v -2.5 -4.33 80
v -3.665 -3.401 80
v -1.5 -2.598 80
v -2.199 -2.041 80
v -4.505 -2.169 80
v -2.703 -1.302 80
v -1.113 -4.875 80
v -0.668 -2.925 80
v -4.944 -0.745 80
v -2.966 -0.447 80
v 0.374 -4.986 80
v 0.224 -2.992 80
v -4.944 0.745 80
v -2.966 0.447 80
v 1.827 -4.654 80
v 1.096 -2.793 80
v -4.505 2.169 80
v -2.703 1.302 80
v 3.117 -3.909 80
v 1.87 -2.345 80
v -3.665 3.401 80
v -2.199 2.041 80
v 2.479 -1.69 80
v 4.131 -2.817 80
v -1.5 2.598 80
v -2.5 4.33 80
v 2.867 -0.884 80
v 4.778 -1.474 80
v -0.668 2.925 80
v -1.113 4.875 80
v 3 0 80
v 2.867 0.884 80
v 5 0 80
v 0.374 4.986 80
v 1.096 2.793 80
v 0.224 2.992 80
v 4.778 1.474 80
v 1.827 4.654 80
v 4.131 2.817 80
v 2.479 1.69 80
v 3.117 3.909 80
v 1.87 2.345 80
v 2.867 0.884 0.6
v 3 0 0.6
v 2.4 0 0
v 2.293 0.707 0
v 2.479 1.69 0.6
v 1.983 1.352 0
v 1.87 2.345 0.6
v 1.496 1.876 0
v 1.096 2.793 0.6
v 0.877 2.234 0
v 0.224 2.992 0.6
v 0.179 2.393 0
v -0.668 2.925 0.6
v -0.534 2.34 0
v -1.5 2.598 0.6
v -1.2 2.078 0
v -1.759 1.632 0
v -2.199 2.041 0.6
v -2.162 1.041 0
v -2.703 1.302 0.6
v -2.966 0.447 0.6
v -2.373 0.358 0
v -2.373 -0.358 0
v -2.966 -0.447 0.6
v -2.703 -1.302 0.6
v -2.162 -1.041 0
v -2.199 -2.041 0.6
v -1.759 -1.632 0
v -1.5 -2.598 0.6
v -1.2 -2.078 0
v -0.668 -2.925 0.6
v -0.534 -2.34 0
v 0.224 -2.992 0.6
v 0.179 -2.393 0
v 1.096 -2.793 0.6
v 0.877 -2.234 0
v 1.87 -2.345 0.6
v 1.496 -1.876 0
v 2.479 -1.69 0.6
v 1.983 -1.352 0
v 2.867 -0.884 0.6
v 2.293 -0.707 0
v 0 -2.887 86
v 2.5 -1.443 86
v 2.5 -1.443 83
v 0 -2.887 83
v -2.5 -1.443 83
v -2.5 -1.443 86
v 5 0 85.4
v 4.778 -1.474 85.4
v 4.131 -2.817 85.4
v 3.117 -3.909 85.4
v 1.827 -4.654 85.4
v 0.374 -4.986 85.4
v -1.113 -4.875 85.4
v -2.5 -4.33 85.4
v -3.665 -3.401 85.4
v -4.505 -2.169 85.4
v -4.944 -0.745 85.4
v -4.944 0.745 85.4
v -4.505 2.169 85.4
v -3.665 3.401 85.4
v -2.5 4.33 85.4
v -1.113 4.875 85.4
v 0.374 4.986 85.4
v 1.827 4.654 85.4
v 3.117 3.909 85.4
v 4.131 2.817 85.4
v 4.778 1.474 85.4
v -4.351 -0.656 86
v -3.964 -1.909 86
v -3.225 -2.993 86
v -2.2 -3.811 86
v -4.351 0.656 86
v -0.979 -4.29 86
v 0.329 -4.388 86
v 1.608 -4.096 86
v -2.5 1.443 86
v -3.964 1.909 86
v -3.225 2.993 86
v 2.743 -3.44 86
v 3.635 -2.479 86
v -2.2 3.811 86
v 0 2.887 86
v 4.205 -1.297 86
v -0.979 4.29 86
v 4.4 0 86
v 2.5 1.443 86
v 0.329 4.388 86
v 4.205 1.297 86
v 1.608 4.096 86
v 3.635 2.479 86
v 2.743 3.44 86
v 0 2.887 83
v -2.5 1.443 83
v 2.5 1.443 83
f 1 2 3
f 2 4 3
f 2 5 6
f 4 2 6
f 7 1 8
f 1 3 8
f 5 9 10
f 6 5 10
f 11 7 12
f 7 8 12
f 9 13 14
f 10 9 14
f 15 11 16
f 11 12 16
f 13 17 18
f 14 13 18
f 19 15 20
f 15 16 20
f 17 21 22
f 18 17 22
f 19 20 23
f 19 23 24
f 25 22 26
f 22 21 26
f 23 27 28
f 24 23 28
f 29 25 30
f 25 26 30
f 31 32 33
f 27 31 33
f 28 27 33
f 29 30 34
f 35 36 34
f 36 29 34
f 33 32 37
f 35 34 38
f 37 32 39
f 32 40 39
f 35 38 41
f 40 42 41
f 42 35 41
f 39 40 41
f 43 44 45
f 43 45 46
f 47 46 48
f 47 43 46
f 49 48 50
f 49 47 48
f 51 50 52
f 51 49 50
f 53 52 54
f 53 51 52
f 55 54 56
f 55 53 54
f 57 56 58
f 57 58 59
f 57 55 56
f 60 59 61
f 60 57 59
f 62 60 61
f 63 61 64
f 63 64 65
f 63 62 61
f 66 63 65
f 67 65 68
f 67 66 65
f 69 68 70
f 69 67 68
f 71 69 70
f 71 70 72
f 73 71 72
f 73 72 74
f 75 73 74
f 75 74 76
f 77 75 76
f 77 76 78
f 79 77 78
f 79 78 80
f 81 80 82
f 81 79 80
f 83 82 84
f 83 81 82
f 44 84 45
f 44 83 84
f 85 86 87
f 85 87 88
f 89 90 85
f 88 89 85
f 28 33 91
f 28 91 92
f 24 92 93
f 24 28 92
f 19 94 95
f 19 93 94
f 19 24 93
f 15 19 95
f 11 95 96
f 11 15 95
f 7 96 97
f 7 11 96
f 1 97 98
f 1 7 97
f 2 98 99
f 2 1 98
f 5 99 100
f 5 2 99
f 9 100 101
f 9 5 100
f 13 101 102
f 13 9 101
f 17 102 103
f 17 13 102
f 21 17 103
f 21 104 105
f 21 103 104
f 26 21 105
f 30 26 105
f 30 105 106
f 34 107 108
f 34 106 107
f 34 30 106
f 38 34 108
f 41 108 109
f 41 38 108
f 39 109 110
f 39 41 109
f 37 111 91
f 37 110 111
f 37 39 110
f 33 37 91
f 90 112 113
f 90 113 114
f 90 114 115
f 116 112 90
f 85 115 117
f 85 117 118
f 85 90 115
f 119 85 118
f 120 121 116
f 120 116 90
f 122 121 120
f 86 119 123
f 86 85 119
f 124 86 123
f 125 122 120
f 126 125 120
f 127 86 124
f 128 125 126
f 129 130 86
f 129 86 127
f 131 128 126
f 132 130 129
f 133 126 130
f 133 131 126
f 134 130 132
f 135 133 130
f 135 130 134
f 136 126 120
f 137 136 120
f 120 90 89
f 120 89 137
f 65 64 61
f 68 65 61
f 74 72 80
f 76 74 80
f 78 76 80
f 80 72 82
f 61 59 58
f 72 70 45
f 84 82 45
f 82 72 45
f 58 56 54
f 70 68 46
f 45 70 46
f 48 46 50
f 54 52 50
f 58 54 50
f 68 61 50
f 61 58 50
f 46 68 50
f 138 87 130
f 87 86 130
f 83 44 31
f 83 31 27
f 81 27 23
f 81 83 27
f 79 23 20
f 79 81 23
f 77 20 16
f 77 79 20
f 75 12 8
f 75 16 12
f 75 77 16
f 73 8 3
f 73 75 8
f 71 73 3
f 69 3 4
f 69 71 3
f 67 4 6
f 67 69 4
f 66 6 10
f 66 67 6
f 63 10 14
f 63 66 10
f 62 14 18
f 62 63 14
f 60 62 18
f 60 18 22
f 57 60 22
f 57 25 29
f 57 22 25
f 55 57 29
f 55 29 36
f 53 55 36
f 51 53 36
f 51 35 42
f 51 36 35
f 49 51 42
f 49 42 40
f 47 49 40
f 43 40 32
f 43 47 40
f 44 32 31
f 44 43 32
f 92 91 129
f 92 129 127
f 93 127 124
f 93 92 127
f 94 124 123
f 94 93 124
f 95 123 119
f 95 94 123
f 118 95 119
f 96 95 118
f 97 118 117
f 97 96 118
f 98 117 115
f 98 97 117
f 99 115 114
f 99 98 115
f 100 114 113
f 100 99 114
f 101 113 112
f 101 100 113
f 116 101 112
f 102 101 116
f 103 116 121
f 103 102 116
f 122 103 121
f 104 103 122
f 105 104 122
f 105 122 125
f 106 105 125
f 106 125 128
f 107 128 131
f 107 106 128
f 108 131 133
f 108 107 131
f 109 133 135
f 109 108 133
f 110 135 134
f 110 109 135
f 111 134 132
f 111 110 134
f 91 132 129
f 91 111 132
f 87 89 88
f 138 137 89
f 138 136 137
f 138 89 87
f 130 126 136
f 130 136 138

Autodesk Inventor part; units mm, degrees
ref_plane "YZ Plane" through (0, 0, 0) normal (1, 0, 0) x (0, 1, 0)
ref_plane "XZ Plane" through (0, 0, 0) normal (0, 1, 0) x (-1, 0, 0)
ref_plane "XY Plane" through (0, 0, 0) normal (0, 0, 1) x (1, 0, 0)
sketch "Sketch1" plane through (0, 0, 0) normal (0, 0, 1) x (1, 0, 0)
  circle A0 centre (0, 0) radius 3
  dimension "Diameter" = 6
extrude "Extrusion1" add sketch "Sketch1" along normal blind 80
sketch "Sketch2" plane through (0, 0, 80) normal (0, 0, 1) x (1, 0, 0)
  circle A0 centre (0, 0) radius 3 projected
  circle A1 centre (0, 0) radius 5
  dimension "Head_Diameter" = 10
extrude "Extrusion2" add sketch "Sketch2" along normal blind 6 contours A0 | A1
sketch "Sketch3" plane through (0, 0, 86) normal (0, 0, 1) x (1, 0, 0)
  circle A0 centre (0, 0) radius 5 projected
  circle A1 centre (0, 0) radius 2.8868 construction
  line L0 (0, 2.8868) -> (2.5, 1.4434)
  line L1 (2.5, -1.4434) -> (2.5, 1.4434)
  line L2 (0, 2.8868) -> (-2.5, 1.4434)
  line L3 (-2.5, -1.4434) -> (-2.5, 1.4434)
  line L4 (-2.5, -1.4434) -> (0, -2.8868)
  line L5 (2.5, -1.4434) -> (0, -2.8868)
  dimension "Hex_Width" = 5
extrude "Extrusion3" cut sketch "Sketch3" against normal blind 3 contours L0 L1 L5 L4 L3 L2
thread "Thread1" size "M6x1" class "4g6g" standard "ANSI Metric M Profile" length 24
chamfer "Chamfer1" distance 0.6 angle 45 2 edges at (-5, 0, 86) (-3, 0, 0)
equation "\"d9\" = ThreadLength"
equation "\"d12\" = Chamfer"
equation "\"ThreadLength\" = 24"
equation "\"Chamfer\" = 0.6"
properties part number "SCREW, SOCKET HD, P, 12.9, M6X1X80MM"
